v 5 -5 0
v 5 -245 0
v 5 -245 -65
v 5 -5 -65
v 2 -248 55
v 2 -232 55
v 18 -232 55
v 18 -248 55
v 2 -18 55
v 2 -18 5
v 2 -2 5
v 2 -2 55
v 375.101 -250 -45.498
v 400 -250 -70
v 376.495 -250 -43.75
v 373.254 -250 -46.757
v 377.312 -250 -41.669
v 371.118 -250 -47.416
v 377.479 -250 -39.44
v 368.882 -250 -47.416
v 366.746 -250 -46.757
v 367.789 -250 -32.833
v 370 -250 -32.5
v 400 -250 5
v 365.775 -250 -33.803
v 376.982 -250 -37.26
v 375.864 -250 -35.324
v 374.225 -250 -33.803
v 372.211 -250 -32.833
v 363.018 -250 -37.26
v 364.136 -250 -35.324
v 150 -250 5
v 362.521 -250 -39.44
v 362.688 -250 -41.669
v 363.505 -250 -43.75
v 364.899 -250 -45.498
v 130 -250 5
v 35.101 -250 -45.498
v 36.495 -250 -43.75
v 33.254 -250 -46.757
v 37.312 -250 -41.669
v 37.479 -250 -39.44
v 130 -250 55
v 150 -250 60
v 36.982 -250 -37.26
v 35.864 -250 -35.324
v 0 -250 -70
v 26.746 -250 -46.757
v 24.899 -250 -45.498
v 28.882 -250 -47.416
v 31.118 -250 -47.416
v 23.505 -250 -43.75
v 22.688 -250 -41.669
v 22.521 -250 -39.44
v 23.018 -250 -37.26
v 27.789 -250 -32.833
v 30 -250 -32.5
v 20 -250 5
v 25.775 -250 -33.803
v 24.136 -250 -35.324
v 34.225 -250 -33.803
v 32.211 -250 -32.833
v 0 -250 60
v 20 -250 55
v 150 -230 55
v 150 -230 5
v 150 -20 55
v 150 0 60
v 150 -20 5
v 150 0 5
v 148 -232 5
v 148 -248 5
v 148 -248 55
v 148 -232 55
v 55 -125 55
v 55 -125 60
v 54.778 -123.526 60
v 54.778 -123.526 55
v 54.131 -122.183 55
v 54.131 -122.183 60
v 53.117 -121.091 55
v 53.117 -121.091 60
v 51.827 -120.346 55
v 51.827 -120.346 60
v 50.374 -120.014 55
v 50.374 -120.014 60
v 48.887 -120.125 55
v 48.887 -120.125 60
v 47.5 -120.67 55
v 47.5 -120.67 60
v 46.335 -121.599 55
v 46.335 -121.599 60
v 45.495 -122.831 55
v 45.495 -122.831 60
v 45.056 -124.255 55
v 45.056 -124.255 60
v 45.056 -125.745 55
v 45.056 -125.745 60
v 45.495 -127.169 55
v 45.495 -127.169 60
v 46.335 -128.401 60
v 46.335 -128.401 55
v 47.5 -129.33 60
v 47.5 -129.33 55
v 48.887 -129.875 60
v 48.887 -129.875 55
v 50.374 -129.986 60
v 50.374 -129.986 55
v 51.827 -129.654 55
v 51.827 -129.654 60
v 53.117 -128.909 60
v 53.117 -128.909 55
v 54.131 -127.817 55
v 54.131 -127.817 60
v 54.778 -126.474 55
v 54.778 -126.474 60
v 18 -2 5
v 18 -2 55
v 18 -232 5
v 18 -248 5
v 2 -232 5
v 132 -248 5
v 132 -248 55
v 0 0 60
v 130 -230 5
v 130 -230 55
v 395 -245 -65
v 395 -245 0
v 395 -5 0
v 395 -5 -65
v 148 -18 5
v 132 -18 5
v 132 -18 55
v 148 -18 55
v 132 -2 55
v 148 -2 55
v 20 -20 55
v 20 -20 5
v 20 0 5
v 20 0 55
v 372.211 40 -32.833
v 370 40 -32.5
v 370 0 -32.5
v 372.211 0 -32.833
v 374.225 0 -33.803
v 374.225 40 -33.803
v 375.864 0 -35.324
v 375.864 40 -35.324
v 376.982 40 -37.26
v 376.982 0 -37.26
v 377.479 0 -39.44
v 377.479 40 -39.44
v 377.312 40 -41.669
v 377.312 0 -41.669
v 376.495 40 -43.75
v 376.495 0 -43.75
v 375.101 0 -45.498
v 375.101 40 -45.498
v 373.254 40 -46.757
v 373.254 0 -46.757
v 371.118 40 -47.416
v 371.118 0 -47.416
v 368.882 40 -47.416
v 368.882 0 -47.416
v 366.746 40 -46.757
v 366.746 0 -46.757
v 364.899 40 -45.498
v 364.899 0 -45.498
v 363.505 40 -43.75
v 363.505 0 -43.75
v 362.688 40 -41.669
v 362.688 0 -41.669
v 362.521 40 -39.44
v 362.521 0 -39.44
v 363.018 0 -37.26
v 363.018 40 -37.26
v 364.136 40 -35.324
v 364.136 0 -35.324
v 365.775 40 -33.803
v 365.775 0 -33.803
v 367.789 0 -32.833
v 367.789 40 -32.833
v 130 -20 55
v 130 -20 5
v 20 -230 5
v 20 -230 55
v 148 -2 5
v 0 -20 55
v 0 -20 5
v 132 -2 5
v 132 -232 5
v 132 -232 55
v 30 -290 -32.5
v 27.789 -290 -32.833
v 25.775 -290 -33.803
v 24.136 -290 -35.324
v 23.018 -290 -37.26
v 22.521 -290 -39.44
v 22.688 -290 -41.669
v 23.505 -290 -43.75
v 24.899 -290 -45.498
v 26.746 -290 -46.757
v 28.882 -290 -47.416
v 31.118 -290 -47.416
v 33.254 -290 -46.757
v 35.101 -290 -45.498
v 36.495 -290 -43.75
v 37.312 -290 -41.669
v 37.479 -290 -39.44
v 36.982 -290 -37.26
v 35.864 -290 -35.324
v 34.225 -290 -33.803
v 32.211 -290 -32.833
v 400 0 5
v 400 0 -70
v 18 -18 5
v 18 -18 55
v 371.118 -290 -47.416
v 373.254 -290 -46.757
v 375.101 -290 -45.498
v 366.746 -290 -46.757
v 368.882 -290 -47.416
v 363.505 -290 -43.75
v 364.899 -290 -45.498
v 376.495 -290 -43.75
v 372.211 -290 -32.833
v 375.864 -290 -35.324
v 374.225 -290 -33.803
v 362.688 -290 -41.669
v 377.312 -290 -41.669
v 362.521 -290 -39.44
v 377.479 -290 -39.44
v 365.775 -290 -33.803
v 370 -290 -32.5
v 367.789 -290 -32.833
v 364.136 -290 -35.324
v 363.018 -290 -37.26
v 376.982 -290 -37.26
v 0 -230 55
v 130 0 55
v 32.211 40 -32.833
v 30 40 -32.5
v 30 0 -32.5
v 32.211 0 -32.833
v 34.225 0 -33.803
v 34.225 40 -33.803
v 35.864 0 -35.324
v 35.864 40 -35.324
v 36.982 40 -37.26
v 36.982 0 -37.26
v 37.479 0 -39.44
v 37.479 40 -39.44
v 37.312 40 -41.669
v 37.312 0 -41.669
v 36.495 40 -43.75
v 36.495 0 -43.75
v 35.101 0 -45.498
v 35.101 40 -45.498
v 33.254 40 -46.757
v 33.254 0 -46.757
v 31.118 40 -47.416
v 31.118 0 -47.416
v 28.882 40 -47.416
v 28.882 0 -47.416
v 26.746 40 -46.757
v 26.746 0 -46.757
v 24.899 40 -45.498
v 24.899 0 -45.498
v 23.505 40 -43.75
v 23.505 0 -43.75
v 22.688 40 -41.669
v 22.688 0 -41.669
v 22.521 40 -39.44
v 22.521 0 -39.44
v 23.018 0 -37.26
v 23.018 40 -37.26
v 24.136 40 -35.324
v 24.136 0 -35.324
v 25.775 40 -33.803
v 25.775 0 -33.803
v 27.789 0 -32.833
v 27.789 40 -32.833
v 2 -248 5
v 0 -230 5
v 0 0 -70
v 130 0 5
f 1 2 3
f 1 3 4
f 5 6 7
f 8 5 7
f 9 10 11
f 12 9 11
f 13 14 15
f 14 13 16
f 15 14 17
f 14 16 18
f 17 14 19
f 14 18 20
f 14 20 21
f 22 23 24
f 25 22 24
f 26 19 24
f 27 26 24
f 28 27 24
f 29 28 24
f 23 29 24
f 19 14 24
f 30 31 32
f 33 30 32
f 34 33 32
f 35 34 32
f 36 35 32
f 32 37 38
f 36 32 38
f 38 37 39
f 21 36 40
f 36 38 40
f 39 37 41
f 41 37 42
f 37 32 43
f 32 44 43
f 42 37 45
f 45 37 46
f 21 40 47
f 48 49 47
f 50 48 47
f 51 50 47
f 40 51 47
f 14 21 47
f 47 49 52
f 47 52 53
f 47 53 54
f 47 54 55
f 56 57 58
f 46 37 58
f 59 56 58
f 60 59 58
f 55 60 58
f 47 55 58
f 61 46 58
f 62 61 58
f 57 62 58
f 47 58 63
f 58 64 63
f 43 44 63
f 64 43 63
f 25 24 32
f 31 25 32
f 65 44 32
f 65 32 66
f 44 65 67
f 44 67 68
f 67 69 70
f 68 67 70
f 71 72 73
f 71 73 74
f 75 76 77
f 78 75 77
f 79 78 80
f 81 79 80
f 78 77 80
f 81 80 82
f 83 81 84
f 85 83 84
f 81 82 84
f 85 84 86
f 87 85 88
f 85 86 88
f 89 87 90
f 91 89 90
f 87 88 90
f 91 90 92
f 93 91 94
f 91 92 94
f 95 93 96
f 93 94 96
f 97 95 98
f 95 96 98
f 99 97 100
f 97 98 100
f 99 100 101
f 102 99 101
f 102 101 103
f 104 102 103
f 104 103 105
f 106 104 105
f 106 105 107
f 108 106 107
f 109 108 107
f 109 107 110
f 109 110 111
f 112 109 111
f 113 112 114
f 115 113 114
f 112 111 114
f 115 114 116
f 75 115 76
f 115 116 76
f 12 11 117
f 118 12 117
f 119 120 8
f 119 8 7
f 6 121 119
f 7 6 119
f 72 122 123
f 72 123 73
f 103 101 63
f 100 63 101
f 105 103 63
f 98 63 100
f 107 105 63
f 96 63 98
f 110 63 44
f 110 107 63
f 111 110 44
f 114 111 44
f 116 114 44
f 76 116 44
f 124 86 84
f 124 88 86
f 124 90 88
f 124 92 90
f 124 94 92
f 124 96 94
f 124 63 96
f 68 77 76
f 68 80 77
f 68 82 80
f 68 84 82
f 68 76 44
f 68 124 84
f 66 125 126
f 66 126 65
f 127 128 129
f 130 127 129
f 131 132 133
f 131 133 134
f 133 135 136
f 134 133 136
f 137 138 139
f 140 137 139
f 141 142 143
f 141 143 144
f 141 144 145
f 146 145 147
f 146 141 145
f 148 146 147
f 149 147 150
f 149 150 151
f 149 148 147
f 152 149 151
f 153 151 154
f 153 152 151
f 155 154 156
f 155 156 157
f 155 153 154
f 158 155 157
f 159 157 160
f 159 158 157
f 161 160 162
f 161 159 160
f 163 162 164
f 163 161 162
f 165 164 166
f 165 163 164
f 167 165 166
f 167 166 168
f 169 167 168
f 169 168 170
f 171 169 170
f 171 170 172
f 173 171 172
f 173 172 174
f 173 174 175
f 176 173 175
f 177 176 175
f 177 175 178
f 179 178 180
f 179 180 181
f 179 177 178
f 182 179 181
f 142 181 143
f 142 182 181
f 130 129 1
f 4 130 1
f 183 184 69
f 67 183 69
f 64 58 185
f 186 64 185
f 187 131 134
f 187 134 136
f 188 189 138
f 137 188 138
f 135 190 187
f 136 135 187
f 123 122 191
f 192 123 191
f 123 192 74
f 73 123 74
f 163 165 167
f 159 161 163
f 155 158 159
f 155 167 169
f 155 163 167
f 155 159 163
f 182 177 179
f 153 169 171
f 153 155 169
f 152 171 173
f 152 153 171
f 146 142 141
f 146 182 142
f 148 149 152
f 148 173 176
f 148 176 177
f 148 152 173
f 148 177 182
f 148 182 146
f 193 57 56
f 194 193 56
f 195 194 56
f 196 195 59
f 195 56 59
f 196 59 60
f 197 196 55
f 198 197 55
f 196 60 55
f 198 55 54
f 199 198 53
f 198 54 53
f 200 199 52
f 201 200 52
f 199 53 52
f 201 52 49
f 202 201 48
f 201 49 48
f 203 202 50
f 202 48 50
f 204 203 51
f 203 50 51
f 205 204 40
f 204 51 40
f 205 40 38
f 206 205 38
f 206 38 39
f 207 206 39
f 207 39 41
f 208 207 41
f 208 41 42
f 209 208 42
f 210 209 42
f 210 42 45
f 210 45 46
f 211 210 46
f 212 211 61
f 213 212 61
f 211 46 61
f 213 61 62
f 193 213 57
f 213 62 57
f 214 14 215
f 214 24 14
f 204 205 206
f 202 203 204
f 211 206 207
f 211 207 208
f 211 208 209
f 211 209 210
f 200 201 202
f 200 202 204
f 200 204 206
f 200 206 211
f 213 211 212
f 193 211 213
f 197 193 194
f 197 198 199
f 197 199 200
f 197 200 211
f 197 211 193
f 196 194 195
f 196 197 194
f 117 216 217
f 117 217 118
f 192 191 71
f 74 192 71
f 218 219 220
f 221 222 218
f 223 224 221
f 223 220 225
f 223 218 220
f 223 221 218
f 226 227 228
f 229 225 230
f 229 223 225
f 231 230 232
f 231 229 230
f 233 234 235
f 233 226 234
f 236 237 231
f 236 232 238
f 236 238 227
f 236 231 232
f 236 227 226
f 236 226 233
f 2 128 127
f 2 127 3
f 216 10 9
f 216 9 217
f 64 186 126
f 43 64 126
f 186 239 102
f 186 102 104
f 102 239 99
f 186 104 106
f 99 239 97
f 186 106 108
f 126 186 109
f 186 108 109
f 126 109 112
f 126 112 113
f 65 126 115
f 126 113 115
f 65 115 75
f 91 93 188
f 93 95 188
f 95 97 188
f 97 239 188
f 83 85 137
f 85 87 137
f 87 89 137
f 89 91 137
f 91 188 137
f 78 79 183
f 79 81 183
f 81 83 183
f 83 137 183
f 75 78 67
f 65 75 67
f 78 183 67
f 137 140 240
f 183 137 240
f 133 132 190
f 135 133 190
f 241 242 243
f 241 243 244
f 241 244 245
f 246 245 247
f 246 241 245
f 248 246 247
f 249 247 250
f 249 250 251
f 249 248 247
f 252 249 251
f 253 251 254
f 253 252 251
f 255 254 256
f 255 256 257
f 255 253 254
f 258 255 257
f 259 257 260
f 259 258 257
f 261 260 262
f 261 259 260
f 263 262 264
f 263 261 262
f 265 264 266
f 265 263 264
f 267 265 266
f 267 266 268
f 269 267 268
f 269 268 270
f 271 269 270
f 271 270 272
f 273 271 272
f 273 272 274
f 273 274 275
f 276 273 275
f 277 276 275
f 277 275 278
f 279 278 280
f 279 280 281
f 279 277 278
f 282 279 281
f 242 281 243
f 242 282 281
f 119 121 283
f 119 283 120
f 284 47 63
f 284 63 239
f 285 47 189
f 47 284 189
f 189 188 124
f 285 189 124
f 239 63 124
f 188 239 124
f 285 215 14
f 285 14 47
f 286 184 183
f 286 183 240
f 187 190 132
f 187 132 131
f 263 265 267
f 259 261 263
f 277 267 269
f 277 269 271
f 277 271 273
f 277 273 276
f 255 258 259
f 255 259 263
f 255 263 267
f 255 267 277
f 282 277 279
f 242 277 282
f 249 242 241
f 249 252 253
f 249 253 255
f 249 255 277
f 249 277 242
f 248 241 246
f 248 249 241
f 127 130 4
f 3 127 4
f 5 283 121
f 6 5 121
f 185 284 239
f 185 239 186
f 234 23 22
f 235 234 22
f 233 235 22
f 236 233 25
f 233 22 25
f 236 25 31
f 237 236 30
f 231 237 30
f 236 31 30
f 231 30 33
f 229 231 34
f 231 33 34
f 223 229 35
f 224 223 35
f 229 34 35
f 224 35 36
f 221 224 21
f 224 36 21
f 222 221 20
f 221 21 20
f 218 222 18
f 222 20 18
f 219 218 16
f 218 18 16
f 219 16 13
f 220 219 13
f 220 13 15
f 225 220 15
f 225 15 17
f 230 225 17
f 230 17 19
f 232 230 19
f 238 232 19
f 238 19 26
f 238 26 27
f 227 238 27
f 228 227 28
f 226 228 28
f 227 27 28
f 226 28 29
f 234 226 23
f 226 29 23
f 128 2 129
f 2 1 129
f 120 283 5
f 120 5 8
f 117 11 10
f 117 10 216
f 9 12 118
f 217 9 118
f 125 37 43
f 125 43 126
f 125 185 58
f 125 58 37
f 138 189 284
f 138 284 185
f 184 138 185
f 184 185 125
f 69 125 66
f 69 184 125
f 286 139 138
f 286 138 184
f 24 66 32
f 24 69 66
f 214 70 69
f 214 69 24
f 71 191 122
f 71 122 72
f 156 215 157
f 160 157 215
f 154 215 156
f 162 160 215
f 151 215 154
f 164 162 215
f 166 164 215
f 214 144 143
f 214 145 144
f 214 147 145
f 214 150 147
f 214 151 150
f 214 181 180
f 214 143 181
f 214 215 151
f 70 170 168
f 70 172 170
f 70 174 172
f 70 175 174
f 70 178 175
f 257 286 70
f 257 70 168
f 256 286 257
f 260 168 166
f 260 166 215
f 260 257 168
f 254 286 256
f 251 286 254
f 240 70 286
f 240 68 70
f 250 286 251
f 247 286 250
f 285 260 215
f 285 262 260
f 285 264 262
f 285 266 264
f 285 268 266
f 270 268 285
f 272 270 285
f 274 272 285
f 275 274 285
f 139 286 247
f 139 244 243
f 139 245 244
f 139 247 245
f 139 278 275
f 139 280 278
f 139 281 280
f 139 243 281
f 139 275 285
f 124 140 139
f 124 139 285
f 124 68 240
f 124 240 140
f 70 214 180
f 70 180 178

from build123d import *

# Parameters (mm, degrees)
SKETCH1_W           = 400
SKETCH1_H           = 250
BOSS_EXTRUDE1_DEPTH = 5
SKETCH2_W           = 20
SKETCH2_H           = 20
SKETCH2_W_2         = 16
SKETCH2_H_2         = 16
BOSS_EXTRUDE3_DEPTH = 50
SKETCH3_W           = 150
SKETCH3_H           = 250
BOSS_EXTRUDE4_DEPTH = 5
SKETCH4_R           = 5
CUT_EXTRUDE1_DEPTH  = 5
SKETCH5_W           = 400
SKETCH5_H           = 250
SKETCH5_W_2         = 390
SKETCH5_H_2         = 240
BOSS_EXTRUDE5_DEPTH = 70
SKETCH6_W           = 400
SKETCH6_H           = 250
BOSS_EXTRUDE6_DEPTH = 5
SKETCH7_R           = 7.5
BOSS_EXTRUDE7_DEPTH = 40
BOSS_EXTRUDE8_START = 40
SKETCH8_R           = 7.5
BOSS_EXTRUDE8_DEPTH = 40


with BuildPart() as part:
    # Sketch1 → Boss-Extrude1 (new body)
    with BuildSketch(Plane.XY):
        with Locations((200, -125)):
            Rectangle(SKETCH1_W, SKETCH1_H)
    extrude(amount=BOSS_EXTRUDE1_DEPTH)

    # Sketch2 → Boss-Extrude3 (add)
    # profile 1 of 4: a face of its own
    with BuildSketch(Plane.XY.offset(5)):
        with Locations((10, -240)):
            Rectangle(SKETCH2_W, SKETCH2_H)
        with Locations((10, -240)):
            Rectangle(SKETCH2_W_2, SKETCH2_H_2, mode=Mode.SUBTRACT)
    # profile 2 of 4: a face of its own
    with BuildSketch(Plane.XY.offset(5)):
        with Locations((140, -240)):
            Rectangle(SKETCH2_W, SKETCH2_H)
        with Locations((140, -240)):
            Rectangle(SKETCH2_W_2, SKETCH2_H_2, mode=Mode.SUBTRACT)
    # profile 3 of 4: a face of its own
    with BuildSketch(Plane.XY.offset(5)):
        with Locations((10, -10)):
            Rectangle(SKETCH2_W, SKETCH2_H)
        with Locations((10, -10)):
            Rectangle(SKETCH2_W_2, SKETCH2_H_2, mode=Mode.SUBTRACT)
    # profile 4 of 4: a face of its own
    with BuildSketch(Plane.XY.offset(5)):
        with Locations((140, -10)):
            Rectangle(SKETCH2_W, SKETCH2_H)
        with Locations((140, -10)):
            Rectangle(SKETCH2_W_2, SKETCH2_H_2, mode=Mode.SUBTRACT)
    extrude(amount=BOSS_EXTRUDE3_DEPTH)

    # Sketch3 → Boss-Extrude4 (add)
    with BuildSketch(Plane.XY.offset(55)):
        with Locations((75, -125)):
            Rectangle(SKETCH3_W, SKETCH3_H)
    extrude(amount=BOSS_EXTRUDE4_DEPTH)

    # Sketch4 → Cut-Extrude1 (cut)
    with BuildSketch(Plane.XY.offset(60)):
        with Locations((50, -125)):
            Circle(SKETCH4_R)
    extrude(amount=-CUT_EXTRUDE1_DEPTH, mode=Mode.SUBTRACT)

    # Sketch5 → Boss-Extrude5 (add)
    with BuildSketch(Plane(origin=(0, 0, 0), x_dir=(-1, 0, 0), z_dir=(0, 0, -1))):
        with Locations((-200, -125)):
            Rectangle(SKETCH5_W, SKETCH5_H)
        with Locations((-200, -125)):
            Rectangle(SKETCH5_W_2, SKETCH5_H_2, mode=Mode.SUBTRACT)
    extrude(amount=BOSS_EXTRUDE5_DEPTH)

    # Sketch6 → Boss-Extrude6 (add)
    with BuildSketch(Plane(origin=(0, 0, -70), x_dir=(-1, 0, 0), z_dir=(0, 0, -1))):
        with Locations((-200, -125)):
            Rectangle(SKETCH6_W, SKETCH6_H)
    extrude(amount=-BOSS_EXTRUDE6_DEPTH)

    # Sketch7 → Boss-Extrude7 (add)
    with BuildSketch(Plane.XZ.offset(250)):
        with Locations(Location((30, -40, 0), (0, 0, 90))):
            Circle(SKETCH7_R)
        with Locations(Location((370, -40, 0), (0, 0, 90))):
            Circle(SKETCH7_R)
    extrude(amount=BOSS_EXTRUDE7_DEPTH)

    # Sketch8 → Boss-Extrude8 (add)
    with BuildSketch(Plane(origin=(0, 0, 0), x_dir=(1, 0, 0), z_dir=(0, 1, 0)).offset(BOSS_EXTRUDE8_START)):
        with Locations(Location((370, 40, 0), (0, 0, 270))):
            Circle(SKETCH8_R)
        with Locations(Location((30, 40, 0), (0, 0, 270))):
            Circle(SKETCH8_R)
    extrude(amount=-BOSS_EXTRUDE8_DEPTH)


solid = part.part
